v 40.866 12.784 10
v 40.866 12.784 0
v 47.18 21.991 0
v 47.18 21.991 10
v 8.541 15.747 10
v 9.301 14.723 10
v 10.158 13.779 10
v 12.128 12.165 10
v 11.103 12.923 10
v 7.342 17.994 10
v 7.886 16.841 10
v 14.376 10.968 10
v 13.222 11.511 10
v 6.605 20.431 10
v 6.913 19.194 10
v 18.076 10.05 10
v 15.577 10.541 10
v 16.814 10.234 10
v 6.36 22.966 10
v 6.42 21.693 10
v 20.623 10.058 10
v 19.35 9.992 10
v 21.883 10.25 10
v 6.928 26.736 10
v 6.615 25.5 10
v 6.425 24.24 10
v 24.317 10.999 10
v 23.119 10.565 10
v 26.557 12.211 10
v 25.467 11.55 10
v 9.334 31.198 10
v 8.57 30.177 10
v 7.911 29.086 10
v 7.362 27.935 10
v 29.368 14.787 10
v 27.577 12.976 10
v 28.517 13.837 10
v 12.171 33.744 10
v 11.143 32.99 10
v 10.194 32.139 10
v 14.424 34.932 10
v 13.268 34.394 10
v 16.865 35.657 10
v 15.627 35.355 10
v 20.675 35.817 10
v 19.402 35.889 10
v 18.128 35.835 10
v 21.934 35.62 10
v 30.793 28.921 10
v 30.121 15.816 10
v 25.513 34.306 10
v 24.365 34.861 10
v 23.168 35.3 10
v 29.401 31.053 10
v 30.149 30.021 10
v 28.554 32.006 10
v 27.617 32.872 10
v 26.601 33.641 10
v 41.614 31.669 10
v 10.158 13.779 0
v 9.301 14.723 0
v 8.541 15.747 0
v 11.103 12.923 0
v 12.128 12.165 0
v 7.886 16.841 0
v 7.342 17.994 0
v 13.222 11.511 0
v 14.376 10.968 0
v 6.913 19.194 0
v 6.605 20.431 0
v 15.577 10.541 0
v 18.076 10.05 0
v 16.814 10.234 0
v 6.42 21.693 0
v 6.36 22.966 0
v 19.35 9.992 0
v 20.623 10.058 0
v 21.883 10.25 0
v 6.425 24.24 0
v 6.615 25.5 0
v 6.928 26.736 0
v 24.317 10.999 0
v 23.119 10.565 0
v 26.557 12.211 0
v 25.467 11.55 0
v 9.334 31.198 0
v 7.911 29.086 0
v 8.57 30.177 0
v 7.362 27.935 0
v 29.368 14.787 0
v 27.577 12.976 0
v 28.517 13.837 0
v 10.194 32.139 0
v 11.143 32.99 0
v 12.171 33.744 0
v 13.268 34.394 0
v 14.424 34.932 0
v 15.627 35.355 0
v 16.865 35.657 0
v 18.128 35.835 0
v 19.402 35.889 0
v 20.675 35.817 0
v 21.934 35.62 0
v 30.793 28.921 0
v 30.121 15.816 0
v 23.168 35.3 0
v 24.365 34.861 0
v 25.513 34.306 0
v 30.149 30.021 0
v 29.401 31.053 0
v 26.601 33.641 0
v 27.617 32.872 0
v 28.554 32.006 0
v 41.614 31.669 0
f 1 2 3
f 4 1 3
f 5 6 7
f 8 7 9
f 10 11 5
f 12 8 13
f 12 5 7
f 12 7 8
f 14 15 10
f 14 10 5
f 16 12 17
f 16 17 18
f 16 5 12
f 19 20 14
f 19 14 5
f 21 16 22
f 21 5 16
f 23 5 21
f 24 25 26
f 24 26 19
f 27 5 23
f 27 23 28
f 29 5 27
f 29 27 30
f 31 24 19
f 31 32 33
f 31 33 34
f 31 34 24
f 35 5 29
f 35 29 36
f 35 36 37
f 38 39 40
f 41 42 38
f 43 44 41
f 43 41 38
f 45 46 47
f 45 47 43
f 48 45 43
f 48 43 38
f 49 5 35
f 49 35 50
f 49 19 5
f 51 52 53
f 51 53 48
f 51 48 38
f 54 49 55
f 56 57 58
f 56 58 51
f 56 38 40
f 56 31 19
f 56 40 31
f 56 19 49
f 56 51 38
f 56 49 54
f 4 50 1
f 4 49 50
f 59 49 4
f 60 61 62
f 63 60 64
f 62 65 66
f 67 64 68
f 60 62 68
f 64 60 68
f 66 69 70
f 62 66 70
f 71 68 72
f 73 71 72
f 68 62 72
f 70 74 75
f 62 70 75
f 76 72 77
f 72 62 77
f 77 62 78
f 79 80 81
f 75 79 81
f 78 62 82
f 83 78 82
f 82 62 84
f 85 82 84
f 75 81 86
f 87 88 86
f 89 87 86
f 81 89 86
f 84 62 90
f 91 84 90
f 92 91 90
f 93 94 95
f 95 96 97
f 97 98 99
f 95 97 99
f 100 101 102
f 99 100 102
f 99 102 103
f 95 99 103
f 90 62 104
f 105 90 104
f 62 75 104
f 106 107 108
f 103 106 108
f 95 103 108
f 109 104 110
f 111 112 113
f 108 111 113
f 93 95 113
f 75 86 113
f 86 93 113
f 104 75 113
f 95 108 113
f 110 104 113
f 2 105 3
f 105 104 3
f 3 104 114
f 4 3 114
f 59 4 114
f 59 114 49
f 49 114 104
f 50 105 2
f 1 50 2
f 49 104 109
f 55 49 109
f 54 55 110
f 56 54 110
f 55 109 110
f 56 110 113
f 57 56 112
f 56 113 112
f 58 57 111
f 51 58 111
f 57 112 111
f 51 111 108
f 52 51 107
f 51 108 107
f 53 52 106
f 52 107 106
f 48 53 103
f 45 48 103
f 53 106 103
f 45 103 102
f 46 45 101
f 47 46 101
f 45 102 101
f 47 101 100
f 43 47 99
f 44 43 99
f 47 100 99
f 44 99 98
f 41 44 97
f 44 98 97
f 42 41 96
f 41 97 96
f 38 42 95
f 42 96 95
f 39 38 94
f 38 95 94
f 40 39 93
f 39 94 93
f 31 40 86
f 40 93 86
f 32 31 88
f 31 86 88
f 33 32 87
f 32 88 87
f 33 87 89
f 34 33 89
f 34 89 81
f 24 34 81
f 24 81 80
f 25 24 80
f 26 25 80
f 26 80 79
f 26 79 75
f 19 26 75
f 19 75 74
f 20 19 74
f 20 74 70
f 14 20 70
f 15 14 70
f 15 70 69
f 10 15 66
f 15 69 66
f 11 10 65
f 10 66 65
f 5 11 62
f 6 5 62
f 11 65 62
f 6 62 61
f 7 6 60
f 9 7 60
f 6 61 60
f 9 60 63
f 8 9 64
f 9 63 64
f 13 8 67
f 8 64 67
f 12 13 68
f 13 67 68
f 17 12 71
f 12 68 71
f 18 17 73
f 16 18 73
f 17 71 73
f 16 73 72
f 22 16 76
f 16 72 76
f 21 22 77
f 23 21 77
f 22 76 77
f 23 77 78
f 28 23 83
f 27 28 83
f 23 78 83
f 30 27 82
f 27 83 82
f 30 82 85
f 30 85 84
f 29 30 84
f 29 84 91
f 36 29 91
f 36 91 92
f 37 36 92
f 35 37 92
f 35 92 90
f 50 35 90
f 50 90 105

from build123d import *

# Parameters (mm, degrees)
PAD_DEPTH = 10


with BuildPart() as part:
    # Sketch → Pad (new body)
    with BuildSketch(Plane.XY):
        with BuildLine():
            ThreePointArc((30.793243, 28.920895), (6.376554, 23.603742), (30.12088, 15.815685))
            Line((30.12088, 15.815685), (40.865706, 12.784345))
            Line((40.865706, 12.784345), (47.180485, 21.991074))
            Line((47.180485, 21.991074), (41.614066, 31.668641))
            Line((41.614066, 31.668641), (30.793243, 28.920895))
        make_face()
    extrude(amount=PAD_DEPTH)


solid = part.part
